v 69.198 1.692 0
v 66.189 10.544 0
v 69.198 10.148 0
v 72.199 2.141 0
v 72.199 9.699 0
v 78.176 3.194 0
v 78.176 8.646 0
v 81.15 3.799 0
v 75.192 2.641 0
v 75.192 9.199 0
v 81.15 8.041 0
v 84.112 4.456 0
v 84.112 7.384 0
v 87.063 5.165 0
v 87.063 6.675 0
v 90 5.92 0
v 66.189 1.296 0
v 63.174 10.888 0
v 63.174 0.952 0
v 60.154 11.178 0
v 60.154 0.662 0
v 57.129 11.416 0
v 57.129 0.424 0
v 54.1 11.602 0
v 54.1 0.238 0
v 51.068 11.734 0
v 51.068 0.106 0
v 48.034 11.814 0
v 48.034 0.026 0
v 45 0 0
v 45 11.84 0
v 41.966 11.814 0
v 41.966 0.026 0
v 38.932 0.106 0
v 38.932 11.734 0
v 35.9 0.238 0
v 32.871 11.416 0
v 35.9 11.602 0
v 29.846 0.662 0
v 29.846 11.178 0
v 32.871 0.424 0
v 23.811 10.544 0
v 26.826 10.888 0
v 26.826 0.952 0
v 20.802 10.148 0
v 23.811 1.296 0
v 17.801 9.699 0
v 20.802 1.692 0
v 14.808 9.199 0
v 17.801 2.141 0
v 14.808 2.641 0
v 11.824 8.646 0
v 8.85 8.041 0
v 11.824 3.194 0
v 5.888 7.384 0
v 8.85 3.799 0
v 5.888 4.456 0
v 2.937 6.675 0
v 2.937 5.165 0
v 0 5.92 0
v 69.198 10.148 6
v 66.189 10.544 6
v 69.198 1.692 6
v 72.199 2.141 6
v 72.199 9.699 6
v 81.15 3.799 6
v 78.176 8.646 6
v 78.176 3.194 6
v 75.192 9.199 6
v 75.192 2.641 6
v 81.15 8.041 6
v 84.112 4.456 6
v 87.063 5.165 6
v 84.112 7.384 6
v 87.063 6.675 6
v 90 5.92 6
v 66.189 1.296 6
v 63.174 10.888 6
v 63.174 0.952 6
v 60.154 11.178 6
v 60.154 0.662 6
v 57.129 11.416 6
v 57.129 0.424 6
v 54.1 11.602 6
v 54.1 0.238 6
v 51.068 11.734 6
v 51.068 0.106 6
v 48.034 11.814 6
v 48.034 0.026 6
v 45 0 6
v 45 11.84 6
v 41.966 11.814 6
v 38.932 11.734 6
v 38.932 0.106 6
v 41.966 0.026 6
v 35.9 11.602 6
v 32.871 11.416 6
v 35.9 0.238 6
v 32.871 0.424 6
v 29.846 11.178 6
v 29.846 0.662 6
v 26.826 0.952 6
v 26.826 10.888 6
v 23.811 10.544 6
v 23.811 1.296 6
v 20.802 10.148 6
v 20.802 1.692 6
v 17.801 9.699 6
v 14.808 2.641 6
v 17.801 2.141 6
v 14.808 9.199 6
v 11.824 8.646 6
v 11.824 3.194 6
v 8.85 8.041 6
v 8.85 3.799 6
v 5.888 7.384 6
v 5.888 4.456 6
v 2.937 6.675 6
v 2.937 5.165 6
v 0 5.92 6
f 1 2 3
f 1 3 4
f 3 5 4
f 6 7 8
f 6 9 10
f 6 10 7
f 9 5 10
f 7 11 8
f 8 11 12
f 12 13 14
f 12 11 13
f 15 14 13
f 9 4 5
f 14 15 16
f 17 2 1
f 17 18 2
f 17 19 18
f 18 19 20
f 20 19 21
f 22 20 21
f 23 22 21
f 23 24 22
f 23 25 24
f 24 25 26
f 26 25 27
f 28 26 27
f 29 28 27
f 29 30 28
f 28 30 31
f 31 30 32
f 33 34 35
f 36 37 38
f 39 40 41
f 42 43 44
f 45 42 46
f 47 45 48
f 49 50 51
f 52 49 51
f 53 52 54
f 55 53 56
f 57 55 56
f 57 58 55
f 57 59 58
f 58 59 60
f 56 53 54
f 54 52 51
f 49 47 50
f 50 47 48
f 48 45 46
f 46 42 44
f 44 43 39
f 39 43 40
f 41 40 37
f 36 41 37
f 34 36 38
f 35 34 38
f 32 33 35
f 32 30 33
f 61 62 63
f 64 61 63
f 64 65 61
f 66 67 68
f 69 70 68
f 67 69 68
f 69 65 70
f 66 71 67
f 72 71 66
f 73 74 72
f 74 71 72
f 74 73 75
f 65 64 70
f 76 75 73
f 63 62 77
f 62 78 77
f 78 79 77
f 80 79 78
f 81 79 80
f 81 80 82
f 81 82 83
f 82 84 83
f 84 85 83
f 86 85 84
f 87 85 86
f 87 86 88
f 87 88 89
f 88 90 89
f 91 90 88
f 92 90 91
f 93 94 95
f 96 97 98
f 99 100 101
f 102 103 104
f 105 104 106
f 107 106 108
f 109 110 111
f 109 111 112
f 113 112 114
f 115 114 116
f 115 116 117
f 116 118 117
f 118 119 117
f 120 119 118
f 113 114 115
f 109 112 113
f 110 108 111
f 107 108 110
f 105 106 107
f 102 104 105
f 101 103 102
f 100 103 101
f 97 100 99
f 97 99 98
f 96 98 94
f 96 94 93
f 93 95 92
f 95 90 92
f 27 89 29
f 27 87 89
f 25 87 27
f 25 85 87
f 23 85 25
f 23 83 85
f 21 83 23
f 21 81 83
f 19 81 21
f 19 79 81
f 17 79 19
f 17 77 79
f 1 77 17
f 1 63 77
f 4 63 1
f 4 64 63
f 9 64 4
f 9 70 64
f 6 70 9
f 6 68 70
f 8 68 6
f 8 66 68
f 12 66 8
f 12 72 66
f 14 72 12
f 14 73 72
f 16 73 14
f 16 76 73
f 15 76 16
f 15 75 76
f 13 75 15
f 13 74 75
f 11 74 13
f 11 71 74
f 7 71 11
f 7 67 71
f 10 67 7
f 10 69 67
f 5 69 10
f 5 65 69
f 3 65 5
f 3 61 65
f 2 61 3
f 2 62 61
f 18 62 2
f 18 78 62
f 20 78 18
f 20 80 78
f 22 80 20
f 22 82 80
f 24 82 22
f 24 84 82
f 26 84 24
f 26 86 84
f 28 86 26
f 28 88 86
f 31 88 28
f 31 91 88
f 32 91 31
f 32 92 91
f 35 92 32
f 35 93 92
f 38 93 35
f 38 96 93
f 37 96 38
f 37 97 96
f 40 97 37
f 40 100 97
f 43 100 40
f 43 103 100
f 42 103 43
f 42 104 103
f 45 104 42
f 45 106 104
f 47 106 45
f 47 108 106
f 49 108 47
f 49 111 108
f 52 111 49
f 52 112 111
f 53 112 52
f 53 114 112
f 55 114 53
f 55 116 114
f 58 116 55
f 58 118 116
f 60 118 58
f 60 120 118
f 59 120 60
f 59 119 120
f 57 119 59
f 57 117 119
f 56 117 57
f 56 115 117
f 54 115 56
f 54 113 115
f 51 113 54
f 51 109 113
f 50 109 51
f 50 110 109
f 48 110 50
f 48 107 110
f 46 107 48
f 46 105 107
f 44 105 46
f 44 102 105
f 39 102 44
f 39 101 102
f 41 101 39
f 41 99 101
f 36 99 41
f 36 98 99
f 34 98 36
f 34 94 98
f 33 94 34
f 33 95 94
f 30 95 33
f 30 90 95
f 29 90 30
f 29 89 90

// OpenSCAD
$fn = 32;

// ----------------------------------------------------------------------
// Arc profile plate: lens, 60 points
// ----------------------------------------------------------------------

// --- parameters (mm) ---
lens_chord = 90;          // chord length of the lens, X
arc_r = 173.87;           // radius of both arcs
arc_angle = 30;           // angle of each arc, degrees
sagitta = 5.92;           // bulge of each arc (half the lens height)
arc_step = 1;             // sampling step of the arcs, degrees
plate_t = 6;              // plate thickness, Z

bbox_y = 2 * sagitta;  // full lens height

profile = [[90, 5.92], [87.063, 6.675], [84.112, 7.384], [81.15, 8.041], [78.176, 8.646], [75.192, 9.199], [72.199, 9.699], [69.198, 10.148], [66.189, 10.544], [63.174, 10.888], [60.154, 11.178], [57.129, 11.416], [54.1, 11.602], [51.068, 11.734], [48.034, 11.814], [45, 11.84], [41.966, 11.814], [38.932, 11.734], [35.9, 11.602], [32.871, 11.416], [29.846, 11.178], [26.826, 10.888], [23.811, 10.544], [20.802, 10.148], [17.801, 9.699], [14.808, 9.199], [11.824, 8.646], [8.85, 8.041], [5.888, 7.384], [2.937, 6.675], [0, 5.92], [2.937, 5.165], [5.888, 4.456], [8.85, 3.799], [11.824, 3.194], [14.808, 2.641], [17.801, 2.141], [20.802, 1.692], [23.811, 1.296], [26.826, 0.952], [29.846, 0.662], [32.871, 0.424], [35.9, 0.238], [38.932, 0.106], [41.966, 0.026], [45, 0], [48.034, 0.026], [51.068, 0.106], [54.1, 0.238], [57.129, 0.424], [60.154, 0.662], [63.174, 0.952], [66.189, 1.296], [69.198, 1.692], [72.199, 2.141], [75.192, 2.641], [78.176, 3.194], [81.15, 3.799], [84.112, 4.456], [87.063, 5.165]];  // primary outline, 60 points, counter clockwise

// --- the one profile operation ---
linear_extrude(height = plate_t) polygon(points = profile);
